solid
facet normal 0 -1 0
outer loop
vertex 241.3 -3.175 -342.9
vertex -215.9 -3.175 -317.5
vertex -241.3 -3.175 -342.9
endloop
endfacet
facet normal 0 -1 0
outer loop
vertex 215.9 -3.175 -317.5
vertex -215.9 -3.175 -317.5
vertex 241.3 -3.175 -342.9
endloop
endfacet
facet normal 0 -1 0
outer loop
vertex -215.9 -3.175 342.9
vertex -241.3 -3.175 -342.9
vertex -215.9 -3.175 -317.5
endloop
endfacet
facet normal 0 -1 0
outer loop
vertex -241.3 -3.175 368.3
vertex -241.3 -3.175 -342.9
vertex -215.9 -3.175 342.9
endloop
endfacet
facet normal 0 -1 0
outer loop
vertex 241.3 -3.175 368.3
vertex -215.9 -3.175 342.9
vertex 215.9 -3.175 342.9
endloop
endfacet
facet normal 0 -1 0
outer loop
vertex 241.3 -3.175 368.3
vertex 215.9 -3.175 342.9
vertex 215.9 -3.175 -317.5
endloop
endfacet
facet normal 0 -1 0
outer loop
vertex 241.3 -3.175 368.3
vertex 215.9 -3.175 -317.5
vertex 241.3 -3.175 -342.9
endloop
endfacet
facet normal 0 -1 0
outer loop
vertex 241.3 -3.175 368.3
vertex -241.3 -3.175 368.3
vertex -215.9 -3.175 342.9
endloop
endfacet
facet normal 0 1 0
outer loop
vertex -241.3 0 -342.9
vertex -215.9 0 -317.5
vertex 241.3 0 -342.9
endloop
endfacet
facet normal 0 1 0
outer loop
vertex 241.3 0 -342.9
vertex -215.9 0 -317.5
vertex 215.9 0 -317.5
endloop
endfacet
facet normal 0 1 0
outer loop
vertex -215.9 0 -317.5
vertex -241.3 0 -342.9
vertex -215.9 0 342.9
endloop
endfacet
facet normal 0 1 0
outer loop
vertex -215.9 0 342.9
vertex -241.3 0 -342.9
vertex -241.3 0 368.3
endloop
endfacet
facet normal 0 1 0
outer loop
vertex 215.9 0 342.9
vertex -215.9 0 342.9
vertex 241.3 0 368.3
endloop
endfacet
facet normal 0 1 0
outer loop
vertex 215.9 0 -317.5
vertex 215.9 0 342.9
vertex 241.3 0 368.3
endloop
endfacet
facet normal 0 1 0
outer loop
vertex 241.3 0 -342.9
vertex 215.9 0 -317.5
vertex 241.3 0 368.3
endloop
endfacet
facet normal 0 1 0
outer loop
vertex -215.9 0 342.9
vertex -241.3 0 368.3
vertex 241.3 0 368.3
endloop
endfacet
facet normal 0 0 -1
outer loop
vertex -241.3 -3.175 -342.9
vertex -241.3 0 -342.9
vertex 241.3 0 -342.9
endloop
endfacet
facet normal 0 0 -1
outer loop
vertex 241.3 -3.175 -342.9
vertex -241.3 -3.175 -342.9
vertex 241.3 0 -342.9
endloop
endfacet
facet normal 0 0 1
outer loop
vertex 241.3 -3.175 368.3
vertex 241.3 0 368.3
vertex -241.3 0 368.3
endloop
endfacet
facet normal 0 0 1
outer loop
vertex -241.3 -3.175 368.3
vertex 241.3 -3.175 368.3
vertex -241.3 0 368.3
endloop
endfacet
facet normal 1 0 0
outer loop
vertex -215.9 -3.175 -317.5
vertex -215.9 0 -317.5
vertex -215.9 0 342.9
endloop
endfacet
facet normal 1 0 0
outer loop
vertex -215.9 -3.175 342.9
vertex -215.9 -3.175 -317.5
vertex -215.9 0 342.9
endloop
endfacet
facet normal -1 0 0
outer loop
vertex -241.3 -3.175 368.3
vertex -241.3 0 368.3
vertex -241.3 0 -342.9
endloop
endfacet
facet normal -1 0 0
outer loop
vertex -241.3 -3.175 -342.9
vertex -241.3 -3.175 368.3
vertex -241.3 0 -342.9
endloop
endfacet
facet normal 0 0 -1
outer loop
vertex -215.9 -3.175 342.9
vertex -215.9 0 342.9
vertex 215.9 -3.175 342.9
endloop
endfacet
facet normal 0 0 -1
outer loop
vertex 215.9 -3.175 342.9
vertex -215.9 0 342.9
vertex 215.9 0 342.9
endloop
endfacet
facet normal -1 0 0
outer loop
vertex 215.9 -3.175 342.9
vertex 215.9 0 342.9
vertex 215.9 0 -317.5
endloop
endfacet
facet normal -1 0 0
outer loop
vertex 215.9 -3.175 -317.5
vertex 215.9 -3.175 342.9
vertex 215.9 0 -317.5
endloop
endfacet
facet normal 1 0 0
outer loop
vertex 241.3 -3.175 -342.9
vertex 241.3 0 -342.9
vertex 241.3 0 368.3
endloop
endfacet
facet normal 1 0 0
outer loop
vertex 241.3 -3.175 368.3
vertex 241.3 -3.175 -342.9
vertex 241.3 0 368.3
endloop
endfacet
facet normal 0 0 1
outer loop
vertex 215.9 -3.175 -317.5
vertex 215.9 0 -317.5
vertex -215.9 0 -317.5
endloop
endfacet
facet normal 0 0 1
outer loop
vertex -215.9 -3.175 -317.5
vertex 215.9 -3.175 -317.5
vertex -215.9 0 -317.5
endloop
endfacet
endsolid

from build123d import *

# Parameters (mm, degrees)
F1_DEPTH = 3.175


with BuildPart() as f1:
    # F0 (on Front) → F1 (new body)
    with BuildSketch(Plane.XZ):
        Polygon((-241.3, 368.3), (-241.3, 342.9), (-215.9, 342.9), (215.9, 342.9), (241.3, 342.9), (241.3, 368.3), align=None)
        Polygon((-215.9, 342.9), (-241.3, 342.9), (-241.3, -342.9), (-215.9, -342.9), (-215.9, -317.5), align=None)
        Polygon((215.9, -317.5), (-215.9, -317.5), (-215.9, -342.9), (0, -342.9), (215.9, -342.9), align=None)
        Polygon((241.3, 342.9), (215.9, 342.9), (215.9, -317.5), (215.9, -342.9), (241.3, -342.9), align=None)
    extrude(amount=F1_DEPTH)


solid = f1.part
